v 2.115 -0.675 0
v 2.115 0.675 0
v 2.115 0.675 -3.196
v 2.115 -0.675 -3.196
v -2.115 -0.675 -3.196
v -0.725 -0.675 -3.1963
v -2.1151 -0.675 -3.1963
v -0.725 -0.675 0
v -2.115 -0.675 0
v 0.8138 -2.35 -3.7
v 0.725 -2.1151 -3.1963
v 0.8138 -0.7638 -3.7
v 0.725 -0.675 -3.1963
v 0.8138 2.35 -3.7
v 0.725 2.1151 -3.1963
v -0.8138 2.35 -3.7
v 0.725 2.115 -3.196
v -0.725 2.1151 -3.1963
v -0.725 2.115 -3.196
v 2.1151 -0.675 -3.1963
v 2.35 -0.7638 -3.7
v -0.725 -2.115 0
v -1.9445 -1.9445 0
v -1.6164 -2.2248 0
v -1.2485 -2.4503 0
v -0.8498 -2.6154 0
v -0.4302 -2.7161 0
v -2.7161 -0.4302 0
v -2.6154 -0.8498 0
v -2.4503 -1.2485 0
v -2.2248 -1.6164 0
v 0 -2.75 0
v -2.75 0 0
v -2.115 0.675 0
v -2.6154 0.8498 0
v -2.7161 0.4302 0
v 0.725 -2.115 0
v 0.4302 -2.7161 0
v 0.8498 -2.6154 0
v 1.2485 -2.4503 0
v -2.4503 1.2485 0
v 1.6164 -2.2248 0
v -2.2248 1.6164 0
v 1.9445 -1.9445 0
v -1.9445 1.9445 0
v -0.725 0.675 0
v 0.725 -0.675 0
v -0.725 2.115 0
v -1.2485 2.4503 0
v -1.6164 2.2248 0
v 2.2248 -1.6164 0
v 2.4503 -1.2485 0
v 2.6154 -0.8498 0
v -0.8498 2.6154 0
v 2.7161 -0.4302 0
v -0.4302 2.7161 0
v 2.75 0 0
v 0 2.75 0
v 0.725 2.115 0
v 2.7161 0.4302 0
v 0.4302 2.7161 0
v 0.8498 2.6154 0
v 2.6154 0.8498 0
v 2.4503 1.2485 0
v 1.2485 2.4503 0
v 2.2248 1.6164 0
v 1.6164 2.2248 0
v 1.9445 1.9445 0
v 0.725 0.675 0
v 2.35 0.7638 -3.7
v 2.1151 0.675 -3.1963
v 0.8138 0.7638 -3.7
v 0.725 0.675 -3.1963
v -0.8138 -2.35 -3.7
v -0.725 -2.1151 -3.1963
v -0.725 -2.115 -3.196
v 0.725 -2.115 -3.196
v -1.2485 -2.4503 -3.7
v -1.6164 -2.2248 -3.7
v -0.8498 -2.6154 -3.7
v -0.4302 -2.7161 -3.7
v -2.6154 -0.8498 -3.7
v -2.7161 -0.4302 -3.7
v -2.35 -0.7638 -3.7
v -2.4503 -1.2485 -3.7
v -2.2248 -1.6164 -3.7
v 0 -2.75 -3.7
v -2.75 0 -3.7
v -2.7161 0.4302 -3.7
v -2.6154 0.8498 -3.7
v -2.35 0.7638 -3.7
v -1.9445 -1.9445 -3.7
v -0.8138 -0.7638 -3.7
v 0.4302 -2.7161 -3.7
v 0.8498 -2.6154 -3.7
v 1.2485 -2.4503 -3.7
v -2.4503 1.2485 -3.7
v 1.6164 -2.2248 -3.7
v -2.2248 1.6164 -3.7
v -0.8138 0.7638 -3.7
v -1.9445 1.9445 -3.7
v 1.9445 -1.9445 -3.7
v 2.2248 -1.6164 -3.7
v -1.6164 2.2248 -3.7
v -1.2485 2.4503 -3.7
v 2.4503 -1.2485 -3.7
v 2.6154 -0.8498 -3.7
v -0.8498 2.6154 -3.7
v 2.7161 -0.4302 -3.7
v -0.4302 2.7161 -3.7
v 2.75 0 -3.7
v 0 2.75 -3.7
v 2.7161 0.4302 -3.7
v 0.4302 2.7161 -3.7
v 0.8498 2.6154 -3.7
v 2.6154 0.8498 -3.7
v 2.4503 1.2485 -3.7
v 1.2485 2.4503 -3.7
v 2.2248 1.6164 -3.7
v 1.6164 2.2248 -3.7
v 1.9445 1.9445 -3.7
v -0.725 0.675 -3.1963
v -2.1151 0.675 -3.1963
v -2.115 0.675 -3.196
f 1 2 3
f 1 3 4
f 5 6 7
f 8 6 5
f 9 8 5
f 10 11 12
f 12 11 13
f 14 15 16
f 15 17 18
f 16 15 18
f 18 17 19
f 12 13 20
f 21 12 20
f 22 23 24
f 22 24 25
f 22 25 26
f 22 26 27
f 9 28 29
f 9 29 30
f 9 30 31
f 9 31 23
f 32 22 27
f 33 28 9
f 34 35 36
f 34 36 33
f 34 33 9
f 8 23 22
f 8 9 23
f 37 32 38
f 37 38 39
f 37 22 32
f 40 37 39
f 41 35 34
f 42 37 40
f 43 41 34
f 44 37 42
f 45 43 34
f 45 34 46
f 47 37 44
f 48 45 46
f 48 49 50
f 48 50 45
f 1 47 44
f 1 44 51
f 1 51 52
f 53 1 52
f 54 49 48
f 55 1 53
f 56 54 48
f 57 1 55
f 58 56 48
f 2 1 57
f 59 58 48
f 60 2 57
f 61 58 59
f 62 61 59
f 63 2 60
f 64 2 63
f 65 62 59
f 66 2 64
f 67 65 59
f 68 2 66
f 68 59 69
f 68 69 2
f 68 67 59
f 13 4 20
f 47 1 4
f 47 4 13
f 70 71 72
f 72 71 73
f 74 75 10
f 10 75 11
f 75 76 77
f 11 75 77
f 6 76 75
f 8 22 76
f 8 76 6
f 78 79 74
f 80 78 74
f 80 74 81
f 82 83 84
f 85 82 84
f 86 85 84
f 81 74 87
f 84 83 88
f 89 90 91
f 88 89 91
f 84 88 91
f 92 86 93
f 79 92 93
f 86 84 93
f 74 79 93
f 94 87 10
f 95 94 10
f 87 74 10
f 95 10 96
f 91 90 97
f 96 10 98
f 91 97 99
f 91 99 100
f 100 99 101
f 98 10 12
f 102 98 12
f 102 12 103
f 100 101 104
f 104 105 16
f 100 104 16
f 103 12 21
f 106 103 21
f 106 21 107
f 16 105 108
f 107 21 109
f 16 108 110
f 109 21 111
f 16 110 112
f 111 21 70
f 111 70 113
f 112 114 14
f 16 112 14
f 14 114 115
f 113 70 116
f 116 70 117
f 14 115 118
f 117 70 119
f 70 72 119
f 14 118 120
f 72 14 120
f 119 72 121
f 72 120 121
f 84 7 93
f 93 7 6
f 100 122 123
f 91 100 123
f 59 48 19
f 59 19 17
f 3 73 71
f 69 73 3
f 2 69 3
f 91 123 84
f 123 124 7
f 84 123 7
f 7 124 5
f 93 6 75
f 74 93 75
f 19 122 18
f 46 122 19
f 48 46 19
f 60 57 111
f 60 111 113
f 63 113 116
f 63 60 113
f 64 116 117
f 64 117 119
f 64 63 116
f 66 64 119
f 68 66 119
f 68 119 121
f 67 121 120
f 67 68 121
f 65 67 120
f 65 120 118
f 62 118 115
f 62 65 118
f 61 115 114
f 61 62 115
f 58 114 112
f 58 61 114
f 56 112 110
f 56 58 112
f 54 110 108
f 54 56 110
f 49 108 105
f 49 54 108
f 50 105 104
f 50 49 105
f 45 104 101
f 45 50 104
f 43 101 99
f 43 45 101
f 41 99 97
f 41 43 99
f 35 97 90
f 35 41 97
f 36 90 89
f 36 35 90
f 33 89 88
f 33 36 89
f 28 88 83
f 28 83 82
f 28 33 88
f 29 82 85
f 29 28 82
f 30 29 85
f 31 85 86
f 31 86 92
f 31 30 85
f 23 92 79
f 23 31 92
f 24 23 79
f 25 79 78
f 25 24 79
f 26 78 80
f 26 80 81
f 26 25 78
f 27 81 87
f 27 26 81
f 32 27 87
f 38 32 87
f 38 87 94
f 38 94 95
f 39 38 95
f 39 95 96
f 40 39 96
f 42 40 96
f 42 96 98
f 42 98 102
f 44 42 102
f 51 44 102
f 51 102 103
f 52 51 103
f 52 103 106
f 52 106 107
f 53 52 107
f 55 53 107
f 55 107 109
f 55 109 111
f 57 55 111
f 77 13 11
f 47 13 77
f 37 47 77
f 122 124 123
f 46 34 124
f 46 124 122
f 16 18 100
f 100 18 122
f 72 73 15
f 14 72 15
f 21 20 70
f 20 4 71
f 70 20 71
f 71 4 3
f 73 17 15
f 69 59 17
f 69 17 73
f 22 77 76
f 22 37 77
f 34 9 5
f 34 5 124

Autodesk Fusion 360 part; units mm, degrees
sketch "Sketch1" plane through (0, 0, 0) normal (0, 0, 1) x (1, 0, 0)
  line L0 (-0.725, 2.115) -> (0.725, 2.115)
  line L1 (0.725, 2.115) -> (0.725, -2.115)
  line L2 (0.725, -2.115) -> (-0.725, -2.115)
  line L3 (-0.725, -2.115) -> (-0.725, 2.115)
  line L4 (-0.725, 2.115) -> (0.725, -2.115) construction
  line L5 (0.725, 2.115) -> (-0.725, -2.115) construction
  line L6 (-2.115, 0.675) -> (2.115, 0.675)
  line L7 (2.115, 0.675) -> (2.115, -0.675)
  line L8 (2.115, -0.675) -> (-2.115, -0.675)
  line L9 (-2.115, -0.675) -> (-2.115, 0.675)
  line L10 (-2.115, 0.675) -> (2.115, -0.675) construction
  line L11 (2.115, 0.675) -> (-2.115, -0.675) construction
  circle A0 centre (0, 0) radius 2.75
  dimension "d21" = 1.45
  dimension "d22" = 4.23
  dimension "d23" = 4.23
  dimension "d24" = 1.35
  dimension "d25" = 5.5
extrude "Extrude1" add sketch "Sketch1" against normal blind 3.7
chamfer "Chamfer1" distance 0.235 angle 65 4 edges at (-2.115, 0, -3.7) (2.115, 0, -3.7) (0, -2.115, -3.7) (0, 2.115, -3.7) measured on face at (-1.6186, -1.0735, -3.7) measured on face at (-1.6186, -1.0735, -3.7) measured on face at (-1.6186, -1.0735, -3.7) measured on face at (-1.6186, -1.0735, -3.7)
chamfer "Chamfer2" distance 0.0889 angle 80 8 edges at (0.725, 1.5125, -3.7) (1.5375, 0.675, -3.7) (1.5375, -0.675, -3.7) (0.725, -1.5125, -3.7) (-0.725, -1.5125, -3.7) (-1.5375, -0.675, -3.7) (-1.5375, 0.675, -3.7) (-0.725, 1.5125, -3.7) measured on face at (-1.0549, 1.725, -3.7) measured on face at (-1.0549, 1.725, -3.7) measured on face at (-1.0549, 1.725, -3.7) measured on face at (-1.0549, 1.725, -3.7) measured on face at (-1.0549, 1.725, -3.7) measured on face at (-1.0549, 1.725, -3.7) measured on face at (-1.0549, 1.725, -3.7) measured on face at (-1.0549, 1.725, -3.7)
equation "width = 5.5 mm"
equation "depth = 5.5 mm"
equation "cross_xy = 4.23 mm"
equation "gap_x = 1.35 mm"
equation "gap_y = 1.45 mm"
equation "height = 3.7 mm"
equation "d13 = -height"
equation "d15 = chamfer_cross"
equation "d16 = chamfer_cross_angle"
equation "d17 = chamfer_gap"
equation "d18 = chamfer_gap_angle"
equation "d21 = gap_y"
equation "d22 = cross_xy"
equation "d23 = cross_xy"
equation "d24 = gap_x"
equation "d25 = width"
equation "chamfer_cross_angle = 65 deg"
equation "chamfer_cross = 0.235 mm"
equation "chamfer_gap_angle = 80 deg"
equation "chamfer_gap = 0.088857 mm"
